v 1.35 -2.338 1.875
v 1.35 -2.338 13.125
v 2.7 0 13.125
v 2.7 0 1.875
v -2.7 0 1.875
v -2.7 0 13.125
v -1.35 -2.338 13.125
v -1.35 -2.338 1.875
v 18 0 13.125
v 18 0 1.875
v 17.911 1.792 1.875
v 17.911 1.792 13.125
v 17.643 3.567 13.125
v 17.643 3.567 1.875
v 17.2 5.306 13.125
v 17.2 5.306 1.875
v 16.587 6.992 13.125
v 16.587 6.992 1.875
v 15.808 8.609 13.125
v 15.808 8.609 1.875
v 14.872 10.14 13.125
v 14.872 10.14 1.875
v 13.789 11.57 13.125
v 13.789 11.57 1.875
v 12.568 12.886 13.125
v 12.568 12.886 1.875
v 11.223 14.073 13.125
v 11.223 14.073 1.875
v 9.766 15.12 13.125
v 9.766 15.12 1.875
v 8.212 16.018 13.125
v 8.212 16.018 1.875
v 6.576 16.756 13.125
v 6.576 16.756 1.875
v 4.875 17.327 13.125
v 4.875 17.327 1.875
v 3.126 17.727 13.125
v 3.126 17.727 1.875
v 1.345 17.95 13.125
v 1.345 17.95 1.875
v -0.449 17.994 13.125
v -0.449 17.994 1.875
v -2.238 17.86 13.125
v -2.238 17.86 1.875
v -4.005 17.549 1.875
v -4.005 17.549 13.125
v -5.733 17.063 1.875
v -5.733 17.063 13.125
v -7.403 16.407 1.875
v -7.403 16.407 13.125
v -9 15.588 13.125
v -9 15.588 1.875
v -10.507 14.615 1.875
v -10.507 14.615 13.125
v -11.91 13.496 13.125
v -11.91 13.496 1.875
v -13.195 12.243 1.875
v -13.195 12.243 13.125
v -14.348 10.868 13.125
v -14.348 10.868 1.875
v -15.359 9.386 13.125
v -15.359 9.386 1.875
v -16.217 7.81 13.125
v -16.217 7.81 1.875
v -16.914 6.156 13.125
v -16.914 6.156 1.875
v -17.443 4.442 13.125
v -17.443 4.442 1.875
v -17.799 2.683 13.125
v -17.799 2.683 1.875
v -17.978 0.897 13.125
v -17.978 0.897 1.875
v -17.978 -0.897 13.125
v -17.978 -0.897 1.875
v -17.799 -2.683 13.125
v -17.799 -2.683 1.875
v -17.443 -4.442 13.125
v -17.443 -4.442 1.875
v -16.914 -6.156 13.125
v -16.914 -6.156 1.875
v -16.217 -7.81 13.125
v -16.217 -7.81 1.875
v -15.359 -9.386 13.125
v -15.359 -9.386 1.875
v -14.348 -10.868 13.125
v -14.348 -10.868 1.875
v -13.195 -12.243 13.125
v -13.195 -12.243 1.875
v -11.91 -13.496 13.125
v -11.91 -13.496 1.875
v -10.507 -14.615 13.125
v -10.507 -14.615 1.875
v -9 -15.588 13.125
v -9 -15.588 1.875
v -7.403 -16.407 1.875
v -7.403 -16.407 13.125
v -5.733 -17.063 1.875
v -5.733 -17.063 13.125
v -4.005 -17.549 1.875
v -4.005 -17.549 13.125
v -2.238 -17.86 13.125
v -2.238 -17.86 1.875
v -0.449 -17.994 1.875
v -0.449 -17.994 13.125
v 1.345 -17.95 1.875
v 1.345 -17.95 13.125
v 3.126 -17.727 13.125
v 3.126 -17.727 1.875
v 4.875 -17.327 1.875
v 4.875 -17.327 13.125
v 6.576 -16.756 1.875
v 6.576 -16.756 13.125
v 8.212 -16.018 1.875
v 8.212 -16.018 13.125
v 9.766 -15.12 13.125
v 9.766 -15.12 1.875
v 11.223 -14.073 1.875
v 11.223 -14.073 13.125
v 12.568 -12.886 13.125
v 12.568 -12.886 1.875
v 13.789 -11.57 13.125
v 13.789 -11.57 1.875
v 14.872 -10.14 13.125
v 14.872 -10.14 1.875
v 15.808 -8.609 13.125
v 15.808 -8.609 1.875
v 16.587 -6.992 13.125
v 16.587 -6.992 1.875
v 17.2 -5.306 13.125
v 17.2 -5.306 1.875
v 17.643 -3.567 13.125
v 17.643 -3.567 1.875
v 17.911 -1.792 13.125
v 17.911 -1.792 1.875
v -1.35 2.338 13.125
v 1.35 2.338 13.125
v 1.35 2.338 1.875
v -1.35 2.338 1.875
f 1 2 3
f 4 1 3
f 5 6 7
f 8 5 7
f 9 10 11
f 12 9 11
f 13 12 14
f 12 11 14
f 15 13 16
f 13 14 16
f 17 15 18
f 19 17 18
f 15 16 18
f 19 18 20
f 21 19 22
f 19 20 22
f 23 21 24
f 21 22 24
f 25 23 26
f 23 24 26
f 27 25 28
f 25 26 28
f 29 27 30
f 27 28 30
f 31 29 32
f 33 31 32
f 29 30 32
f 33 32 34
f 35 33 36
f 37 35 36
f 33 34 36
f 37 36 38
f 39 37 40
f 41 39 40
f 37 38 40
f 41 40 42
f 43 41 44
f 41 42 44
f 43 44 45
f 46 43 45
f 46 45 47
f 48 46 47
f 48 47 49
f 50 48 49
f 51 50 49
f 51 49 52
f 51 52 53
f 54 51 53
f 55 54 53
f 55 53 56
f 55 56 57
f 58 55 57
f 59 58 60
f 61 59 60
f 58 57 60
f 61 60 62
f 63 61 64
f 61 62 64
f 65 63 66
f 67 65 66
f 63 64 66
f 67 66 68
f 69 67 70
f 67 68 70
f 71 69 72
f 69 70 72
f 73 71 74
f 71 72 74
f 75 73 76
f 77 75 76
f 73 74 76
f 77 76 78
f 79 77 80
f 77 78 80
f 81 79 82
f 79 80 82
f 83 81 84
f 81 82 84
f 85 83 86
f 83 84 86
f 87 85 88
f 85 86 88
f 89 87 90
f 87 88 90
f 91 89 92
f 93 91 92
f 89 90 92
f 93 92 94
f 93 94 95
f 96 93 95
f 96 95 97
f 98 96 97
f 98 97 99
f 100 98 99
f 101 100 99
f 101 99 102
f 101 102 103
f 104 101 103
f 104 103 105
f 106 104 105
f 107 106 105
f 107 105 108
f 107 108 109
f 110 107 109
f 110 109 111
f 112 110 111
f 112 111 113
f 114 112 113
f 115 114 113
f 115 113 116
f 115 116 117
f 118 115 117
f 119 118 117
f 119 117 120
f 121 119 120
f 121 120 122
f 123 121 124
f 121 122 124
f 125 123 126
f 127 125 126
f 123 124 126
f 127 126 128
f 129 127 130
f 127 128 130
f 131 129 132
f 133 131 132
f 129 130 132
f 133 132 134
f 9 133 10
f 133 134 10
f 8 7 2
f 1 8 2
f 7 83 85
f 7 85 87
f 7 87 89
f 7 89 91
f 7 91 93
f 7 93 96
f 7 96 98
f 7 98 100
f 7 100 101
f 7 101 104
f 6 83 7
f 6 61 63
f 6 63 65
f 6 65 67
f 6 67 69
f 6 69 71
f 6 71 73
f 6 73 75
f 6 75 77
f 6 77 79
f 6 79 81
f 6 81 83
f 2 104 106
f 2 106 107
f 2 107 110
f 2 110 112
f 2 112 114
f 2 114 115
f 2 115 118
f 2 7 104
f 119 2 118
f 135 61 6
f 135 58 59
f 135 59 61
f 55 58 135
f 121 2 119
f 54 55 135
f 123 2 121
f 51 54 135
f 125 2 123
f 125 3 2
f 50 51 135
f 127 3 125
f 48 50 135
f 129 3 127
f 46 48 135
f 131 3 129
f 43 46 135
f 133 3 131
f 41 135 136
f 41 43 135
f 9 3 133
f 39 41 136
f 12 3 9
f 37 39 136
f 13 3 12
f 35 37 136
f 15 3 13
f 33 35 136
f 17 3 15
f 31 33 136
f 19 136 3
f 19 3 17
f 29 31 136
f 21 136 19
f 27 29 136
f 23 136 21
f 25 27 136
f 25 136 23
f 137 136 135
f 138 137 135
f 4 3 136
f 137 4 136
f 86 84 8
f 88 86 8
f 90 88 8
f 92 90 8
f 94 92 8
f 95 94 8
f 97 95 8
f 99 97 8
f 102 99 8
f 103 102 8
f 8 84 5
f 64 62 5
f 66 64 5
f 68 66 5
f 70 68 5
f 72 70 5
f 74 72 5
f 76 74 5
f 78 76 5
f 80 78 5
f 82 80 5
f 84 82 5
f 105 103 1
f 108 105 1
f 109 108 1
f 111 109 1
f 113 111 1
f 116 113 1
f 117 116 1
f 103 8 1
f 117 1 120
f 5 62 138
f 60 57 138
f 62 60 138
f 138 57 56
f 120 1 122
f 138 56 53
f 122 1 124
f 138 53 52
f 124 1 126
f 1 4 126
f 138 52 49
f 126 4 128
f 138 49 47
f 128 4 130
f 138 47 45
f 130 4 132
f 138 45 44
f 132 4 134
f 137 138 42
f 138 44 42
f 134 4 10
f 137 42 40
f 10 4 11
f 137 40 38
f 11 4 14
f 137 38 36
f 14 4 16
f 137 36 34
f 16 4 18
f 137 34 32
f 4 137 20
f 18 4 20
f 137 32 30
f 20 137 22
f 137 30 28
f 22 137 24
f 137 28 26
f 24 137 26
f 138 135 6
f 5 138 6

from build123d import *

# Parameters (mm, degrees)
SKETCH1_R           = 24
BOSS_EXTRUDE1_DEPTH = 15
CUT_EXTRUDE1_DEPTH  = 38.107950631
SCALE1_SCALE        = 0.75


with BuildPart() as part:
    # Sketch1 → Boss-Extrude1 (new body)
    with BuildSketch(Plane.XY):
        Circle(SKETCH1_R)
    extrude(amount=BOSS_EXTRUDE1_DEPTH)

    # Sketch2 → Cut-Extrude1 (cut, through all)
    with BuildSketch(Plane.XY.offset(15)):
        Polygon((3.6, 0), (1.8, 3.117691454), (-1.8, 3.117691454), (-3.6, 0), (-1.8, -3.117691454), (1.8, -3.117691454), align=None)
    extrude(amount=-CUT_EXTRUDE1_DEPTH, mode=Mode.SUBTRACT)


with BuildPart() as part_1:
    # Scale1: scaled about (0, 0, 7.5)
    add(part.part.scale(SCALE1_SCALE).moved(Location((0, 0, 1.875))))


solid = part_1.part
